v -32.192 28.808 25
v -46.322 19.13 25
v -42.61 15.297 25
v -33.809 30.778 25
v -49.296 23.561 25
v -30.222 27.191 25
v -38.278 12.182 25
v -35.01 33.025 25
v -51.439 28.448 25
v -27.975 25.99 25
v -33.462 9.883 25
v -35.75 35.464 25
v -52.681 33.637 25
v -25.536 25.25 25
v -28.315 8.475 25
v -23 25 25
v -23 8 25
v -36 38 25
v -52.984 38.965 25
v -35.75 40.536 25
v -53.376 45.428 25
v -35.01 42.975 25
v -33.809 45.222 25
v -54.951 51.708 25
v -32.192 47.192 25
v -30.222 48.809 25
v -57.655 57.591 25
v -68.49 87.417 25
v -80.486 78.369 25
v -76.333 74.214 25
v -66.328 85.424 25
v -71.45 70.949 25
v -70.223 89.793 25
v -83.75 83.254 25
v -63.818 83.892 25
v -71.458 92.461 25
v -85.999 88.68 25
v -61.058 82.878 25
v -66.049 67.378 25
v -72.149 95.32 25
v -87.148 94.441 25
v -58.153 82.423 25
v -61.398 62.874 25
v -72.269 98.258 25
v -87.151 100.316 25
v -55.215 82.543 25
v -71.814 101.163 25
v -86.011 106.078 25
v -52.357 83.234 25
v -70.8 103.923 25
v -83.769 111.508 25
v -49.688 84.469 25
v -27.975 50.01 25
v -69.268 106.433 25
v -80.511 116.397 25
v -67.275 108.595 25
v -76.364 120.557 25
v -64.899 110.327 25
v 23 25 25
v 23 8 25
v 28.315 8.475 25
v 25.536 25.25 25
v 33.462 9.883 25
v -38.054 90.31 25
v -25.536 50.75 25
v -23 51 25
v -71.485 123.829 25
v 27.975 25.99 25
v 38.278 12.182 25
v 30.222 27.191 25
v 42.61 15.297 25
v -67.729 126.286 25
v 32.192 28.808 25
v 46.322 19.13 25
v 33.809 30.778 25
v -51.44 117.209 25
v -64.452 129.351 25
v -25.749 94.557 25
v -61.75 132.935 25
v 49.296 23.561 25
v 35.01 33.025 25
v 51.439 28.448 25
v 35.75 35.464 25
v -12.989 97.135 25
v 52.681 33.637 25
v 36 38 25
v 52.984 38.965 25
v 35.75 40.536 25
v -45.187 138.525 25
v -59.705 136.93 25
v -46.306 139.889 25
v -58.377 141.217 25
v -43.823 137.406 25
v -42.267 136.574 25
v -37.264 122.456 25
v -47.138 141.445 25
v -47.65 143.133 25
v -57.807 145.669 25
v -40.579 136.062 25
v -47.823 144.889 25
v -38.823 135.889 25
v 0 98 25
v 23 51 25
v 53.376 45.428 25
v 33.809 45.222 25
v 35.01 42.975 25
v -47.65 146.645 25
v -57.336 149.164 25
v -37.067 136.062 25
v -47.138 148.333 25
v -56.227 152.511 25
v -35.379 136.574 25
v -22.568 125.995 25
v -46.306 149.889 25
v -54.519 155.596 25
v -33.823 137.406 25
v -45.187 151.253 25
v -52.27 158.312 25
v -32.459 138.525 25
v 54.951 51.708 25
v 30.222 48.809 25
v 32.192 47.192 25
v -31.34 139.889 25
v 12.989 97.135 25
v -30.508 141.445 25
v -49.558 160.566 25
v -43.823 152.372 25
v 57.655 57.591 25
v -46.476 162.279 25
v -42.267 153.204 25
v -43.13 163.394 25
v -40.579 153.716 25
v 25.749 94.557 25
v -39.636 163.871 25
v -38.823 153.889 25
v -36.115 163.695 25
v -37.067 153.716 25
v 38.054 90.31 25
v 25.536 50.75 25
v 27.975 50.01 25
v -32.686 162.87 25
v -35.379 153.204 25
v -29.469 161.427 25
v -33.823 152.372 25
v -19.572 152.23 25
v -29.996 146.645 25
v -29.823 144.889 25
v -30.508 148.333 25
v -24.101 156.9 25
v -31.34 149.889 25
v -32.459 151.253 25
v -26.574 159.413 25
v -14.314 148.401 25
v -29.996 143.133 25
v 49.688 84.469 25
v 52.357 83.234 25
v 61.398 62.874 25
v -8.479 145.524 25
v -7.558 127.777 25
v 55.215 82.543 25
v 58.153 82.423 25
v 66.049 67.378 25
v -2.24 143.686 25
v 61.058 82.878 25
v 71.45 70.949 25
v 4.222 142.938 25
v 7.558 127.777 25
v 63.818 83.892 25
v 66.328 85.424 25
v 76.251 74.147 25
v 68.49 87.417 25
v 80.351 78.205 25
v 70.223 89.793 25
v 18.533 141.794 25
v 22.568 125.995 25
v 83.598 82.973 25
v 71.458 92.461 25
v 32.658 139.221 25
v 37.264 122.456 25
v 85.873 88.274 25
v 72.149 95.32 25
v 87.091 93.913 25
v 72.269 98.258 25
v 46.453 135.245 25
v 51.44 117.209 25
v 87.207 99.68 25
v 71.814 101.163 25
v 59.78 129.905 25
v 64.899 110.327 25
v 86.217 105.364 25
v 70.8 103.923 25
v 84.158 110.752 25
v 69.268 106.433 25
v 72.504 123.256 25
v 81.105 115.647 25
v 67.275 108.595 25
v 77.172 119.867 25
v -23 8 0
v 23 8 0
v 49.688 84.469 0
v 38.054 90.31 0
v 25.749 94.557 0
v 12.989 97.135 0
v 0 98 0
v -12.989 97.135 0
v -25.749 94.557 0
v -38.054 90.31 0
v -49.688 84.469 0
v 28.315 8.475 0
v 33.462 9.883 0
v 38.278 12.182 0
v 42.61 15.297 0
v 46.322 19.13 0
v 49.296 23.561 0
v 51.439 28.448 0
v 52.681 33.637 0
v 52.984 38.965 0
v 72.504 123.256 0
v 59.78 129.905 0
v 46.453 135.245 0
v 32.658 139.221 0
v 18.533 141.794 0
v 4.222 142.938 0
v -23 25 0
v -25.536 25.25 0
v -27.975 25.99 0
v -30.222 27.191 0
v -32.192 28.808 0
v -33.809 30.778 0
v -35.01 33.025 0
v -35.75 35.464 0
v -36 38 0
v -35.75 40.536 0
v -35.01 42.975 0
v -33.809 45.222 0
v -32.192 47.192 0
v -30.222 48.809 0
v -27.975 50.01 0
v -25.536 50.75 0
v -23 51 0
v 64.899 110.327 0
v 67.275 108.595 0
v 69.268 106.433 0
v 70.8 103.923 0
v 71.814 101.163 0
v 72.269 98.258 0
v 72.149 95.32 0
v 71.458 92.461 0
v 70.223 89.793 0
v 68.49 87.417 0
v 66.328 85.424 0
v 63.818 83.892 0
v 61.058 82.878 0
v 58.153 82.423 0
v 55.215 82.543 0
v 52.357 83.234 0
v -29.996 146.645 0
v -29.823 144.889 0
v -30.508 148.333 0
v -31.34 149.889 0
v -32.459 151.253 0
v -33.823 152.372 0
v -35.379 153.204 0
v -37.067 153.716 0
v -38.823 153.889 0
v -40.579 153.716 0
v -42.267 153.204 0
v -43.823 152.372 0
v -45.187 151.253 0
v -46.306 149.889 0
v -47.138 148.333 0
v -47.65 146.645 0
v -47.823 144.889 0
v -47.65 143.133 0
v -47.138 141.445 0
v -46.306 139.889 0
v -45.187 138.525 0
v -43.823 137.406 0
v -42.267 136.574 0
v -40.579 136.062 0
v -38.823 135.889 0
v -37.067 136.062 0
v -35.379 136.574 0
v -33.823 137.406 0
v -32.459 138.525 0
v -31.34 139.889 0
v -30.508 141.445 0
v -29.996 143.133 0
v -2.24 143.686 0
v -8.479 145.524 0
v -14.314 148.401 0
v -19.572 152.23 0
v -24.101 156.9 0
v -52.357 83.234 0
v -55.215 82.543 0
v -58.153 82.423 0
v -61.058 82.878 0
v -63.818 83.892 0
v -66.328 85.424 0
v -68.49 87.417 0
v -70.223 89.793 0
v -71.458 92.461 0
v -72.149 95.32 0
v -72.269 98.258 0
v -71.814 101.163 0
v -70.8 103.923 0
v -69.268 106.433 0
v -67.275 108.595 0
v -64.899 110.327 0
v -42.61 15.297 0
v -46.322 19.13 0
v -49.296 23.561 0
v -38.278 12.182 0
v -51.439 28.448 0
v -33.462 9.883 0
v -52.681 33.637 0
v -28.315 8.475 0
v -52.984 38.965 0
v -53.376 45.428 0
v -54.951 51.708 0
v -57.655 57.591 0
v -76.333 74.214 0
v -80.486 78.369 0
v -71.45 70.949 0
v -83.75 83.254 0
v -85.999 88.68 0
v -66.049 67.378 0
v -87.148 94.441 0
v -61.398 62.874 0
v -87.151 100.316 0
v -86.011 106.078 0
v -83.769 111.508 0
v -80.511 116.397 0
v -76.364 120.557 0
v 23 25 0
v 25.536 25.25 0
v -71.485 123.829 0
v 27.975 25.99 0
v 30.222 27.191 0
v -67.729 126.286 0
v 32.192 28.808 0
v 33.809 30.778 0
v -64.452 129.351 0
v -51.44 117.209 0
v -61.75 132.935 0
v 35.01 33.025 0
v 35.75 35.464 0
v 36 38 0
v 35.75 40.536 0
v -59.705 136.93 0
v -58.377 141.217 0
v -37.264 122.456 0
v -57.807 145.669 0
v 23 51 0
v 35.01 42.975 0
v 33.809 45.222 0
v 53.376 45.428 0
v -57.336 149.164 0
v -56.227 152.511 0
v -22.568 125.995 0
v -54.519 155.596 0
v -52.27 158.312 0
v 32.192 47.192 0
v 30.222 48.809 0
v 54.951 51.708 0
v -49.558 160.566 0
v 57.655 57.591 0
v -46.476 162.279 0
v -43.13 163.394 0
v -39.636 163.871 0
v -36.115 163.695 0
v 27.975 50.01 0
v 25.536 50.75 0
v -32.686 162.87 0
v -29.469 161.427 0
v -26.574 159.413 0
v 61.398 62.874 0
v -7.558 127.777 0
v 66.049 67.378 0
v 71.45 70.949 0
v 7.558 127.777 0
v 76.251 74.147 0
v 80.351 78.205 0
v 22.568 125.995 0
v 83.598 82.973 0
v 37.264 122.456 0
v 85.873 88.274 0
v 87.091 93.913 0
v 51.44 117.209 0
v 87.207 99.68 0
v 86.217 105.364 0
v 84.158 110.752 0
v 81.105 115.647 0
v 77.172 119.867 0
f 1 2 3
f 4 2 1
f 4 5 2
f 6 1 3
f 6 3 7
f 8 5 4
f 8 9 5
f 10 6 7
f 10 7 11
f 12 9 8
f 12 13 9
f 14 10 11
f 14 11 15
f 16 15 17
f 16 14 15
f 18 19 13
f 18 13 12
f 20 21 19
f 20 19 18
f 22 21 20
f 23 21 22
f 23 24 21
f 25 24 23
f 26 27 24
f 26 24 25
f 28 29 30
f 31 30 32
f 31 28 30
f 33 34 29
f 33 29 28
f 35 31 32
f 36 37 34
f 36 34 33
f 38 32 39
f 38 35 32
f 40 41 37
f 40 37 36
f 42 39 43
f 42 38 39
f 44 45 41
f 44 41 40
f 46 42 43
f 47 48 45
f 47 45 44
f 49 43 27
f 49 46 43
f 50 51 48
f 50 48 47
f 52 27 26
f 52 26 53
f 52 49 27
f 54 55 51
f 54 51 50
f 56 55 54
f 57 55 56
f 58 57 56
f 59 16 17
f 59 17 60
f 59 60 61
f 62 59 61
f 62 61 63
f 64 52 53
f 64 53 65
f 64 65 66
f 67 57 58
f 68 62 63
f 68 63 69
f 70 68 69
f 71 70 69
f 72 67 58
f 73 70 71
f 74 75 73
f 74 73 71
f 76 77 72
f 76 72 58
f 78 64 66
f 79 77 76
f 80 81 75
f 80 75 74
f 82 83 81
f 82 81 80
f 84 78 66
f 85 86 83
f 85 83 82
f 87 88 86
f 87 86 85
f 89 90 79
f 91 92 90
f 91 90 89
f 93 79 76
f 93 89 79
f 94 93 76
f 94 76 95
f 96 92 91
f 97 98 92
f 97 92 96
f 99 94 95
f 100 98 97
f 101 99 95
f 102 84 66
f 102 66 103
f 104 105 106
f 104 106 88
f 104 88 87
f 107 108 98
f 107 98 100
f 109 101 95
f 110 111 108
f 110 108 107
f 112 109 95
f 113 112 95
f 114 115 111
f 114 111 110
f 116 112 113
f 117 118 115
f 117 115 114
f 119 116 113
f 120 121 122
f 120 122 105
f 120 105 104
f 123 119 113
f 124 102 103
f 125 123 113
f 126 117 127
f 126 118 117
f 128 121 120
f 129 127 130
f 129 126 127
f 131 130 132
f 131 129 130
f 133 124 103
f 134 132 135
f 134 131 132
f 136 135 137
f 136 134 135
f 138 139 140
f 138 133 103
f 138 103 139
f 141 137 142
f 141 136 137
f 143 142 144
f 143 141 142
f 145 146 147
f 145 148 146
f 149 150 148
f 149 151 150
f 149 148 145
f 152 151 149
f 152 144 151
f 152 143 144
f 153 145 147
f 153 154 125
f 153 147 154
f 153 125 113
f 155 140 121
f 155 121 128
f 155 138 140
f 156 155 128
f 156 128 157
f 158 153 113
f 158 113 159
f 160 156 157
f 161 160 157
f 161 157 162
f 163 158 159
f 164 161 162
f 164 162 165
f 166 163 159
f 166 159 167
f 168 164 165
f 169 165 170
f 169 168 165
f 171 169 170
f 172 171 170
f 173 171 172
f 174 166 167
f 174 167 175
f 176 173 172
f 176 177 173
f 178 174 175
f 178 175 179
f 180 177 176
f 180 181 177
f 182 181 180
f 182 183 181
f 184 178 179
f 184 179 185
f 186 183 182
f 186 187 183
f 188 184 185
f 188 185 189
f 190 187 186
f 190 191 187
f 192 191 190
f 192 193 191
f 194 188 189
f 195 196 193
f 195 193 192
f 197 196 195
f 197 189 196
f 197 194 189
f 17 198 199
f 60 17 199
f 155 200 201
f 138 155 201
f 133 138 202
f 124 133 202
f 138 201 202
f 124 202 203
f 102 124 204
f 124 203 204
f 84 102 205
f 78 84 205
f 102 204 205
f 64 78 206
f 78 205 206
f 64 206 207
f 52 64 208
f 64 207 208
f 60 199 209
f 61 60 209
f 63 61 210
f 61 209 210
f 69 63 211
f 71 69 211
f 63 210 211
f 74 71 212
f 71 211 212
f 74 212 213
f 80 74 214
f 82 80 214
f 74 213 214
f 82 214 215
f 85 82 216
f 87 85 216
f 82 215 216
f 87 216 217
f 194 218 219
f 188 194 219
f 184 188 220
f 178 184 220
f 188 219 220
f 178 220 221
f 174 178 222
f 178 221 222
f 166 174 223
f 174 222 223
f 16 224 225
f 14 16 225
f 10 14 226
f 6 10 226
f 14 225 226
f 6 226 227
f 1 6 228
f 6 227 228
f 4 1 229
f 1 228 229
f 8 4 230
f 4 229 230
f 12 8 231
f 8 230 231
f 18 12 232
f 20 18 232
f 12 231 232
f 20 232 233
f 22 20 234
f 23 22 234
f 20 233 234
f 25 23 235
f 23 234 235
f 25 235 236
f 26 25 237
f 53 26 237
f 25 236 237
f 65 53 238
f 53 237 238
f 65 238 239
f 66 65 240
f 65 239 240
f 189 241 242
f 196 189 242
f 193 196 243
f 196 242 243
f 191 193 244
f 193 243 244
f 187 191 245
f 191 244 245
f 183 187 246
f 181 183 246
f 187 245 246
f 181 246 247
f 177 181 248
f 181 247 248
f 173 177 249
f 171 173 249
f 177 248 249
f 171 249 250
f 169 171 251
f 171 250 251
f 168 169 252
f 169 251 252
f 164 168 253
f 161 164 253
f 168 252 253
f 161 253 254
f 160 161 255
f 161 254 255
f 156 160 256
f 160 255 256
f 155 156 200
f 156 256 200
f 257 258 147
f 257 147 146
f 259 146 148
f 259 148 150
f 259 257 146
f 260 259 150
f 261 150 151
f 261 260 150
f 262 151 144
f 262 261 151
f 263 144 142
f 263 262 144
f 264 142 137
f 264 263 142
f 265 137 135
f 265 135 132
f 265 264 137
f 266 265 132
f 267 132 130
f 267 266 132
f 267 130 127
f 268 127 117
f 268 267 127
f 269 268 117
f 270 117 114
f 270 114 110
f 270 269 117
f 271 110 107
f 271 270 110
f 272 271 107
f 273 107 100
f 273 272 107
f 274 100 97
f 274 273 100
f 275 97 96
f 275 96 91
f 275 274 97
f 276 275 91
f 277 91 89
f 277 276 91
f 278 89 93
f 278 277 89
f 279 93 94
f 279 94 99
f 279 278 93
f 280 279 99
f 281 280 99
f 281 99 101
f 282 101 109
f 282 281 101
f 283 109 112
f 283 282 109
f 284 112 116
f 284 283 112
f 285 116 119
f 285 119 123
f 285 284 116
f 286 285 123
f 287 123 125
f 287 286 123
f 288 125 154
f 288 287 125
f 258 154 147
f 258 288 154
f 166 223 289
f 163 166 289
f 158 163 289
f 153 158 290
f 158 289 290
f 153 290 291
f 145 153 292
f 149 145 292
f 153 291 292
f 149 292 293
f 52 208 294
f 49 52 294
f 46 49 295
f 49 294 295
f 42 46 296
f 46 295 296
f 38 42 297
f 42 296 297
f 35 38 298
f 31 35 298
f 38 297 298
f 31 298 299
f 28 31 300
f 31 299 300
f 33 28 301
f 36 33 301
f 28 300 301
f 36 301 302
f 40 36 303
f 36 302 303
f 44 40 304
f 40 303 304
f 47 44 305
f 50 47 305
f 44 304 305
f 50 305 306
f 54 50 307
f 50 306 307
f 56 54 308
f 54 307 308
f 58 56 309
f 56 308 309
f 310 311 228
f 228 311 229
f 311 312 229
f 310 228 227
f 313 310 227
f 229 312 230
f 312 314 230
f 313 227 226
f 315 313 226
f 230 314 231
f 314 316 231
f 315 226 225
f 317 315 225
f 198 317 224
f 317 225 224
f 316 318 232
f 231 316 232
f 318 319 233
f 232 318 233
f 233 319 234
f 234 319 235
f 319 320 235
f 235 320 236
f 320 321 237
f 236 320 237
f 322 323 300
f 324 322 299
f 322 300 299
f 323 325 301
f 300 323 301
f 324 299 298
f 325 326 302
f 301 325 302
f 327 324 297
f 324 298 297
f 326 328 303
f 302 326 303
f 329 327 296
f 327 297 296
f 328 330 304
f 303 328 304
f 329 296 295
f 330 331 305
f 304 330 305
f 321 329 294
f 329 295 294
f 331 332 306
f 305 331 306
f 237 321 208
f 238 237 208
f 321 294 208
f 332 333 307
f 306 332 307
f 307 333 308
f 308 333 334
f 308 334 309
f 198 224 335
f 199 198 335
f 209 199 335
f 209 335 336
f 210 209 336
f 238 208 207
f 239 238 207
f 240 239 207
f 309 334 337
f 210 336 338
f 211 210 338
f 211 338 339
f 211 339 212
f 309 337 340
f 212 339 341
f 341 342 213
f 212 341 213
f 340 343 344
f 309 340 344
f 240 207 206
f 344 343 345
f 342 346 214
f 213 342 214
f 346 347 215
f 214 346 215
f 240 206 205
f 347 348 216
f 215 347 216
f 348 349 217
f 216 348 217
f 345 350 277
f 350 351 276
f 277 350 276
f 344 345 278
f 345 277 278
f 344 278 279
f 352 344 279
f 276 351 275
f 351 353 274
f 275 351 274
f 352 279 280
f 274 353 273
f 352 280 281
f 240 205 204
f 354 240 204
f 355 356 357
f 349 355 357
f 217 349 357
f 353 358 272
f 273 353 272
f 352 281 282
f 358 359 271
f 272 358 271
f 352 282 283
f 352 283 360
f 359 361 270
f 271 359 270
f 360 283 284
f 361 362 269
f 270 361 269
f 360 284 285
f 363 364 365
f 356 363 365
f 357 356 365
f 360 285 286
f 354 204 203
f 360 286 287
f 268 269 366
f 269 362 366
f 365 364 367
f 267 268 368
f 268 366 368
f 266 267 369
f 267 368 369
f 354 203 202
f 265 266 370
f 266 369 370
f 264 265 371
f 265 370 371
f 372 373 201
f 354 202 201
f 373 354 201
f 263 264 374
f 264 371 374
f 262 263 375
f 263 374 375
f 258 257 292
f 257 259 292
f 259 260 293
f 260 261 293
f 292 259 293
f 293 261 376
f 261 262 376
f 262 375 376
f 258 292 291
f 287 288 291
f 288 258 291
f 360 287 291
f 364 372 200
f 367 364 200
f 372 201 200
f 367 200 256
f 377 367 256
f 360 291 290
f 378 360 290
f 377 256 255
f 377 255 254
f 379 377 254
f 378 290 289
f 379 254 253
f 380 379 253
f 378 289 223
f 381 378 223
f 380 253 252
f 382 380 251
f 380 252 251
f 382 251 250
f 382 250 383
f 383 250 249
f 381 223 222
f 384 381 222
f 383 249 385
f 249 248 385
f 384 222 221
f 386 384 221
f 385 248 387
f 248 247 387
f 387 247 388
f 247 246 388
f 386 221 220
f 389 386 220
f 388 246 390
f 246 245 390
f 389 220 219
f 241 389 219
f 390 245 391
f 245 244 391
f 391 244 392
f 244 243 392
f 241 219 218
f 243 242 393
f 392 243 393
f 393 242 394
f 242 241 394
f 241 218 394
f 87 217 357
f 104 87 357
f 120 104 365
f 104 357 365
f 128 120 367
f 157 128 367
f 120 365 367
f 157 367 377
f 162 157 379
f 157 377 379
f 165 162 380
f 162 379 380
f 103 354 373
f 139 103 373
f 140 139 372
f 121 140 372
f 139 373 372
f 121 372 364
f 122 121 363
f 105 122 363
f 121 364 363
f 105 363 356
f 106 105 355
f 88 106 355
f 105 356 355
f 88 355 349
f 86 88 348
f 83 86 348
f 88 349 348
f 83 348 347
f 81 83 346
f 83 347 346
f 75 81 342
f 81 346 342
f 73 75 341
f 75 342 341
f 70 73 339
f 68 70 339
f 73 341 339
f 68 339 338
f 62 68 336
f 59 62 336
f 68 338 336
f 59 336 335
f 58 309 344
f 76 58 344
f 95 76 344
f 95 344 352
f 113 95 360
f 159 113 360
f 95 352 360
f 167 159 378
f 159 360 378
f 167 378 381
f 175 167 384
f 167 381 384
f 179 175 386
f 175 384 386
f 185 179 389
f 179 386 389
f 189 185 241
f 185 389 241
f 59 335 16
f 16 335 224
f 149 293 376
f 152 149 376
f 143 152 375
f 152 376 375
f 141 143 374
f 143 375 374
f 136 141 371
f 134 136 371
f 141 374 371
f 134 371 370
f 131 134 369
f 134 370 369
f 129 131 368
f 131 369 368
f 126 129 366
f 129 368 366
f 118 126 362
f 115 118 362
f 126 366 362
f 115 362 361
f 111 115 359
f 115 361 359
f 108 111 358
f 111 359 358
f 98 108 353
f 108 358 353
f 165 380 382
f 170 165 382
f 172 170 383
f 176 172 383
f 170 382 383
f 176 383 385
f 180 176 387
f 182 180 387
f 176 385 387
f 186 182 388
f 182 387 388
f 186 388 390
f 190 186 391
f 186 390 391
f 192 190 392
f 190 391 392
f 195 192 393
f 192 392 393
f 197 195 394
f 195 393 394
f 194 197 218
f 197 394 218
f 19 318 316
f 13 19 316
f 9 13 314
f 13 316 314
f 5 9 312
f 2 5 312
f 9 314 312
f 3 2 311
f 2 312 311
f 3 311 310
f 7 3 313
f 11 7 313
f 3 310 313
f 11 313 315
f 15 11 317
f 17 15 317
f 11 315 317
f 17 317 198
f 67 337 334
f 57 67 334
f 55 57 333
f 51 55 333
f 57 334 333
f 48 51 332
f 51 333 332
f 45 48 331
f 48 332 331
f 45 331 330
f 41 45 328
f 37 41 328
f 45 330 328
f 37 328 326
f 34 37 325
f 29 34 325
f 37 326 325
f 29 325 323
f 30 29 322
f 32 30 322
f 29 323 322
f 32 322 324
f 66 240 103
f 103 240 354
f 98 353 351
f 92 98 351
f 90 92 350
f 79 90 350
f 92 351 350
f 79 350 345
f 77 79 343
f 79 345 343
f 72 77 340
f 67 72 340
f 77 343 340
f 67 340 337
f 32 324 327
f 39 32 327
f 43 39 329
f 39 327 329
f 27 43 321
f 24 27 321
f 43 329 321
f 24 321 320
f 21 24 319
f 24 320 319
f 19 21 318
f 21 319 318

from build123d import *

# Parameters (mm, degrees)
F0_R     = 9
F1_DEPTH = 25


with BuildPart() as f1:
    # F0 (on Top) → F1 (new body)
    with BuildSketch(Plane.XY):
        with BuildLine():
            ThreePointArc((-24.100695, 156.899617), (-44.828984, 162.91459), (-57.806842, 145.668806))
            ThreePointArc((-57.806842, 145.668806), (-61.750067, 132.935178), (-71.485406, 123.829275))
            ThreePointArc((-71.485406, 123.829275), (-87.293644, 97.378424), (-71.450292, 70.948591))
            ThreePointArc((-71.450292, 70.948591), (-57.655484, 57.590544), (-52.98448, 38.964866))
            ThreePointArc((-52.98448, 38.964866), (-44.551636, 17.130716), (-23, 8))
            Line((-23, 8), (23, 8))
            ThreePointArc((23, 8), (44.551636, 17.130716), (52.98448, 38.964866))
            ThreePointArc((52.98448, 38.964866), (57.655484, 57.590544), (71.450292, 70.948591))
            ThreePointArc((71.450292, 70.948591), (87.287561, 96.793932), (72.504354, 123.256313))
            ThreePointArc((72.504354, 123.256313), (39.60509, 137.406102), (4.221762, 142.937667))
            ThreePointArc((4.221762, 142.937667), (-11.458365, 146.837486), (-24.100695, 156.899617))
        make_face()
        with BuildLine():
            Line((-23, 51), (22.999999, 51))
            ThreePointArc((22.999999, 51), (36, 38), (22.999999, 25))
            Line((22.999999, 25), (-23, 25))
            ThreePointArc((-23, 25), (-36, 38), (-23, 51))
        make_face(mode=Mode.SUBTRACT)
        with BuildLine():
            ThreePointArc((-49.688299, 84.469361), (-70.222634, 89.792993), (-64.899002, 110.327329))
            ThreePointArc((-64.899002, 110.327329), (0, 128), (64.899002, 110.327329))
            ThreePointArc((64.899002, 110.327329), (70.222634, 89.792993), (49.688299, 84.469361))
            ThreePointArc((49.688299, 84.469361), (0, 98), (-49.688299, 84.469361))
        make_face(mode=Mode.SUBTRACT)
        with Locations((-38.822857, 144.888874)):
            Circle(F0_R, mode=Mode.SUBTRACT)
    extrude(amount=F1_DEPTH)


solid = f1.part
